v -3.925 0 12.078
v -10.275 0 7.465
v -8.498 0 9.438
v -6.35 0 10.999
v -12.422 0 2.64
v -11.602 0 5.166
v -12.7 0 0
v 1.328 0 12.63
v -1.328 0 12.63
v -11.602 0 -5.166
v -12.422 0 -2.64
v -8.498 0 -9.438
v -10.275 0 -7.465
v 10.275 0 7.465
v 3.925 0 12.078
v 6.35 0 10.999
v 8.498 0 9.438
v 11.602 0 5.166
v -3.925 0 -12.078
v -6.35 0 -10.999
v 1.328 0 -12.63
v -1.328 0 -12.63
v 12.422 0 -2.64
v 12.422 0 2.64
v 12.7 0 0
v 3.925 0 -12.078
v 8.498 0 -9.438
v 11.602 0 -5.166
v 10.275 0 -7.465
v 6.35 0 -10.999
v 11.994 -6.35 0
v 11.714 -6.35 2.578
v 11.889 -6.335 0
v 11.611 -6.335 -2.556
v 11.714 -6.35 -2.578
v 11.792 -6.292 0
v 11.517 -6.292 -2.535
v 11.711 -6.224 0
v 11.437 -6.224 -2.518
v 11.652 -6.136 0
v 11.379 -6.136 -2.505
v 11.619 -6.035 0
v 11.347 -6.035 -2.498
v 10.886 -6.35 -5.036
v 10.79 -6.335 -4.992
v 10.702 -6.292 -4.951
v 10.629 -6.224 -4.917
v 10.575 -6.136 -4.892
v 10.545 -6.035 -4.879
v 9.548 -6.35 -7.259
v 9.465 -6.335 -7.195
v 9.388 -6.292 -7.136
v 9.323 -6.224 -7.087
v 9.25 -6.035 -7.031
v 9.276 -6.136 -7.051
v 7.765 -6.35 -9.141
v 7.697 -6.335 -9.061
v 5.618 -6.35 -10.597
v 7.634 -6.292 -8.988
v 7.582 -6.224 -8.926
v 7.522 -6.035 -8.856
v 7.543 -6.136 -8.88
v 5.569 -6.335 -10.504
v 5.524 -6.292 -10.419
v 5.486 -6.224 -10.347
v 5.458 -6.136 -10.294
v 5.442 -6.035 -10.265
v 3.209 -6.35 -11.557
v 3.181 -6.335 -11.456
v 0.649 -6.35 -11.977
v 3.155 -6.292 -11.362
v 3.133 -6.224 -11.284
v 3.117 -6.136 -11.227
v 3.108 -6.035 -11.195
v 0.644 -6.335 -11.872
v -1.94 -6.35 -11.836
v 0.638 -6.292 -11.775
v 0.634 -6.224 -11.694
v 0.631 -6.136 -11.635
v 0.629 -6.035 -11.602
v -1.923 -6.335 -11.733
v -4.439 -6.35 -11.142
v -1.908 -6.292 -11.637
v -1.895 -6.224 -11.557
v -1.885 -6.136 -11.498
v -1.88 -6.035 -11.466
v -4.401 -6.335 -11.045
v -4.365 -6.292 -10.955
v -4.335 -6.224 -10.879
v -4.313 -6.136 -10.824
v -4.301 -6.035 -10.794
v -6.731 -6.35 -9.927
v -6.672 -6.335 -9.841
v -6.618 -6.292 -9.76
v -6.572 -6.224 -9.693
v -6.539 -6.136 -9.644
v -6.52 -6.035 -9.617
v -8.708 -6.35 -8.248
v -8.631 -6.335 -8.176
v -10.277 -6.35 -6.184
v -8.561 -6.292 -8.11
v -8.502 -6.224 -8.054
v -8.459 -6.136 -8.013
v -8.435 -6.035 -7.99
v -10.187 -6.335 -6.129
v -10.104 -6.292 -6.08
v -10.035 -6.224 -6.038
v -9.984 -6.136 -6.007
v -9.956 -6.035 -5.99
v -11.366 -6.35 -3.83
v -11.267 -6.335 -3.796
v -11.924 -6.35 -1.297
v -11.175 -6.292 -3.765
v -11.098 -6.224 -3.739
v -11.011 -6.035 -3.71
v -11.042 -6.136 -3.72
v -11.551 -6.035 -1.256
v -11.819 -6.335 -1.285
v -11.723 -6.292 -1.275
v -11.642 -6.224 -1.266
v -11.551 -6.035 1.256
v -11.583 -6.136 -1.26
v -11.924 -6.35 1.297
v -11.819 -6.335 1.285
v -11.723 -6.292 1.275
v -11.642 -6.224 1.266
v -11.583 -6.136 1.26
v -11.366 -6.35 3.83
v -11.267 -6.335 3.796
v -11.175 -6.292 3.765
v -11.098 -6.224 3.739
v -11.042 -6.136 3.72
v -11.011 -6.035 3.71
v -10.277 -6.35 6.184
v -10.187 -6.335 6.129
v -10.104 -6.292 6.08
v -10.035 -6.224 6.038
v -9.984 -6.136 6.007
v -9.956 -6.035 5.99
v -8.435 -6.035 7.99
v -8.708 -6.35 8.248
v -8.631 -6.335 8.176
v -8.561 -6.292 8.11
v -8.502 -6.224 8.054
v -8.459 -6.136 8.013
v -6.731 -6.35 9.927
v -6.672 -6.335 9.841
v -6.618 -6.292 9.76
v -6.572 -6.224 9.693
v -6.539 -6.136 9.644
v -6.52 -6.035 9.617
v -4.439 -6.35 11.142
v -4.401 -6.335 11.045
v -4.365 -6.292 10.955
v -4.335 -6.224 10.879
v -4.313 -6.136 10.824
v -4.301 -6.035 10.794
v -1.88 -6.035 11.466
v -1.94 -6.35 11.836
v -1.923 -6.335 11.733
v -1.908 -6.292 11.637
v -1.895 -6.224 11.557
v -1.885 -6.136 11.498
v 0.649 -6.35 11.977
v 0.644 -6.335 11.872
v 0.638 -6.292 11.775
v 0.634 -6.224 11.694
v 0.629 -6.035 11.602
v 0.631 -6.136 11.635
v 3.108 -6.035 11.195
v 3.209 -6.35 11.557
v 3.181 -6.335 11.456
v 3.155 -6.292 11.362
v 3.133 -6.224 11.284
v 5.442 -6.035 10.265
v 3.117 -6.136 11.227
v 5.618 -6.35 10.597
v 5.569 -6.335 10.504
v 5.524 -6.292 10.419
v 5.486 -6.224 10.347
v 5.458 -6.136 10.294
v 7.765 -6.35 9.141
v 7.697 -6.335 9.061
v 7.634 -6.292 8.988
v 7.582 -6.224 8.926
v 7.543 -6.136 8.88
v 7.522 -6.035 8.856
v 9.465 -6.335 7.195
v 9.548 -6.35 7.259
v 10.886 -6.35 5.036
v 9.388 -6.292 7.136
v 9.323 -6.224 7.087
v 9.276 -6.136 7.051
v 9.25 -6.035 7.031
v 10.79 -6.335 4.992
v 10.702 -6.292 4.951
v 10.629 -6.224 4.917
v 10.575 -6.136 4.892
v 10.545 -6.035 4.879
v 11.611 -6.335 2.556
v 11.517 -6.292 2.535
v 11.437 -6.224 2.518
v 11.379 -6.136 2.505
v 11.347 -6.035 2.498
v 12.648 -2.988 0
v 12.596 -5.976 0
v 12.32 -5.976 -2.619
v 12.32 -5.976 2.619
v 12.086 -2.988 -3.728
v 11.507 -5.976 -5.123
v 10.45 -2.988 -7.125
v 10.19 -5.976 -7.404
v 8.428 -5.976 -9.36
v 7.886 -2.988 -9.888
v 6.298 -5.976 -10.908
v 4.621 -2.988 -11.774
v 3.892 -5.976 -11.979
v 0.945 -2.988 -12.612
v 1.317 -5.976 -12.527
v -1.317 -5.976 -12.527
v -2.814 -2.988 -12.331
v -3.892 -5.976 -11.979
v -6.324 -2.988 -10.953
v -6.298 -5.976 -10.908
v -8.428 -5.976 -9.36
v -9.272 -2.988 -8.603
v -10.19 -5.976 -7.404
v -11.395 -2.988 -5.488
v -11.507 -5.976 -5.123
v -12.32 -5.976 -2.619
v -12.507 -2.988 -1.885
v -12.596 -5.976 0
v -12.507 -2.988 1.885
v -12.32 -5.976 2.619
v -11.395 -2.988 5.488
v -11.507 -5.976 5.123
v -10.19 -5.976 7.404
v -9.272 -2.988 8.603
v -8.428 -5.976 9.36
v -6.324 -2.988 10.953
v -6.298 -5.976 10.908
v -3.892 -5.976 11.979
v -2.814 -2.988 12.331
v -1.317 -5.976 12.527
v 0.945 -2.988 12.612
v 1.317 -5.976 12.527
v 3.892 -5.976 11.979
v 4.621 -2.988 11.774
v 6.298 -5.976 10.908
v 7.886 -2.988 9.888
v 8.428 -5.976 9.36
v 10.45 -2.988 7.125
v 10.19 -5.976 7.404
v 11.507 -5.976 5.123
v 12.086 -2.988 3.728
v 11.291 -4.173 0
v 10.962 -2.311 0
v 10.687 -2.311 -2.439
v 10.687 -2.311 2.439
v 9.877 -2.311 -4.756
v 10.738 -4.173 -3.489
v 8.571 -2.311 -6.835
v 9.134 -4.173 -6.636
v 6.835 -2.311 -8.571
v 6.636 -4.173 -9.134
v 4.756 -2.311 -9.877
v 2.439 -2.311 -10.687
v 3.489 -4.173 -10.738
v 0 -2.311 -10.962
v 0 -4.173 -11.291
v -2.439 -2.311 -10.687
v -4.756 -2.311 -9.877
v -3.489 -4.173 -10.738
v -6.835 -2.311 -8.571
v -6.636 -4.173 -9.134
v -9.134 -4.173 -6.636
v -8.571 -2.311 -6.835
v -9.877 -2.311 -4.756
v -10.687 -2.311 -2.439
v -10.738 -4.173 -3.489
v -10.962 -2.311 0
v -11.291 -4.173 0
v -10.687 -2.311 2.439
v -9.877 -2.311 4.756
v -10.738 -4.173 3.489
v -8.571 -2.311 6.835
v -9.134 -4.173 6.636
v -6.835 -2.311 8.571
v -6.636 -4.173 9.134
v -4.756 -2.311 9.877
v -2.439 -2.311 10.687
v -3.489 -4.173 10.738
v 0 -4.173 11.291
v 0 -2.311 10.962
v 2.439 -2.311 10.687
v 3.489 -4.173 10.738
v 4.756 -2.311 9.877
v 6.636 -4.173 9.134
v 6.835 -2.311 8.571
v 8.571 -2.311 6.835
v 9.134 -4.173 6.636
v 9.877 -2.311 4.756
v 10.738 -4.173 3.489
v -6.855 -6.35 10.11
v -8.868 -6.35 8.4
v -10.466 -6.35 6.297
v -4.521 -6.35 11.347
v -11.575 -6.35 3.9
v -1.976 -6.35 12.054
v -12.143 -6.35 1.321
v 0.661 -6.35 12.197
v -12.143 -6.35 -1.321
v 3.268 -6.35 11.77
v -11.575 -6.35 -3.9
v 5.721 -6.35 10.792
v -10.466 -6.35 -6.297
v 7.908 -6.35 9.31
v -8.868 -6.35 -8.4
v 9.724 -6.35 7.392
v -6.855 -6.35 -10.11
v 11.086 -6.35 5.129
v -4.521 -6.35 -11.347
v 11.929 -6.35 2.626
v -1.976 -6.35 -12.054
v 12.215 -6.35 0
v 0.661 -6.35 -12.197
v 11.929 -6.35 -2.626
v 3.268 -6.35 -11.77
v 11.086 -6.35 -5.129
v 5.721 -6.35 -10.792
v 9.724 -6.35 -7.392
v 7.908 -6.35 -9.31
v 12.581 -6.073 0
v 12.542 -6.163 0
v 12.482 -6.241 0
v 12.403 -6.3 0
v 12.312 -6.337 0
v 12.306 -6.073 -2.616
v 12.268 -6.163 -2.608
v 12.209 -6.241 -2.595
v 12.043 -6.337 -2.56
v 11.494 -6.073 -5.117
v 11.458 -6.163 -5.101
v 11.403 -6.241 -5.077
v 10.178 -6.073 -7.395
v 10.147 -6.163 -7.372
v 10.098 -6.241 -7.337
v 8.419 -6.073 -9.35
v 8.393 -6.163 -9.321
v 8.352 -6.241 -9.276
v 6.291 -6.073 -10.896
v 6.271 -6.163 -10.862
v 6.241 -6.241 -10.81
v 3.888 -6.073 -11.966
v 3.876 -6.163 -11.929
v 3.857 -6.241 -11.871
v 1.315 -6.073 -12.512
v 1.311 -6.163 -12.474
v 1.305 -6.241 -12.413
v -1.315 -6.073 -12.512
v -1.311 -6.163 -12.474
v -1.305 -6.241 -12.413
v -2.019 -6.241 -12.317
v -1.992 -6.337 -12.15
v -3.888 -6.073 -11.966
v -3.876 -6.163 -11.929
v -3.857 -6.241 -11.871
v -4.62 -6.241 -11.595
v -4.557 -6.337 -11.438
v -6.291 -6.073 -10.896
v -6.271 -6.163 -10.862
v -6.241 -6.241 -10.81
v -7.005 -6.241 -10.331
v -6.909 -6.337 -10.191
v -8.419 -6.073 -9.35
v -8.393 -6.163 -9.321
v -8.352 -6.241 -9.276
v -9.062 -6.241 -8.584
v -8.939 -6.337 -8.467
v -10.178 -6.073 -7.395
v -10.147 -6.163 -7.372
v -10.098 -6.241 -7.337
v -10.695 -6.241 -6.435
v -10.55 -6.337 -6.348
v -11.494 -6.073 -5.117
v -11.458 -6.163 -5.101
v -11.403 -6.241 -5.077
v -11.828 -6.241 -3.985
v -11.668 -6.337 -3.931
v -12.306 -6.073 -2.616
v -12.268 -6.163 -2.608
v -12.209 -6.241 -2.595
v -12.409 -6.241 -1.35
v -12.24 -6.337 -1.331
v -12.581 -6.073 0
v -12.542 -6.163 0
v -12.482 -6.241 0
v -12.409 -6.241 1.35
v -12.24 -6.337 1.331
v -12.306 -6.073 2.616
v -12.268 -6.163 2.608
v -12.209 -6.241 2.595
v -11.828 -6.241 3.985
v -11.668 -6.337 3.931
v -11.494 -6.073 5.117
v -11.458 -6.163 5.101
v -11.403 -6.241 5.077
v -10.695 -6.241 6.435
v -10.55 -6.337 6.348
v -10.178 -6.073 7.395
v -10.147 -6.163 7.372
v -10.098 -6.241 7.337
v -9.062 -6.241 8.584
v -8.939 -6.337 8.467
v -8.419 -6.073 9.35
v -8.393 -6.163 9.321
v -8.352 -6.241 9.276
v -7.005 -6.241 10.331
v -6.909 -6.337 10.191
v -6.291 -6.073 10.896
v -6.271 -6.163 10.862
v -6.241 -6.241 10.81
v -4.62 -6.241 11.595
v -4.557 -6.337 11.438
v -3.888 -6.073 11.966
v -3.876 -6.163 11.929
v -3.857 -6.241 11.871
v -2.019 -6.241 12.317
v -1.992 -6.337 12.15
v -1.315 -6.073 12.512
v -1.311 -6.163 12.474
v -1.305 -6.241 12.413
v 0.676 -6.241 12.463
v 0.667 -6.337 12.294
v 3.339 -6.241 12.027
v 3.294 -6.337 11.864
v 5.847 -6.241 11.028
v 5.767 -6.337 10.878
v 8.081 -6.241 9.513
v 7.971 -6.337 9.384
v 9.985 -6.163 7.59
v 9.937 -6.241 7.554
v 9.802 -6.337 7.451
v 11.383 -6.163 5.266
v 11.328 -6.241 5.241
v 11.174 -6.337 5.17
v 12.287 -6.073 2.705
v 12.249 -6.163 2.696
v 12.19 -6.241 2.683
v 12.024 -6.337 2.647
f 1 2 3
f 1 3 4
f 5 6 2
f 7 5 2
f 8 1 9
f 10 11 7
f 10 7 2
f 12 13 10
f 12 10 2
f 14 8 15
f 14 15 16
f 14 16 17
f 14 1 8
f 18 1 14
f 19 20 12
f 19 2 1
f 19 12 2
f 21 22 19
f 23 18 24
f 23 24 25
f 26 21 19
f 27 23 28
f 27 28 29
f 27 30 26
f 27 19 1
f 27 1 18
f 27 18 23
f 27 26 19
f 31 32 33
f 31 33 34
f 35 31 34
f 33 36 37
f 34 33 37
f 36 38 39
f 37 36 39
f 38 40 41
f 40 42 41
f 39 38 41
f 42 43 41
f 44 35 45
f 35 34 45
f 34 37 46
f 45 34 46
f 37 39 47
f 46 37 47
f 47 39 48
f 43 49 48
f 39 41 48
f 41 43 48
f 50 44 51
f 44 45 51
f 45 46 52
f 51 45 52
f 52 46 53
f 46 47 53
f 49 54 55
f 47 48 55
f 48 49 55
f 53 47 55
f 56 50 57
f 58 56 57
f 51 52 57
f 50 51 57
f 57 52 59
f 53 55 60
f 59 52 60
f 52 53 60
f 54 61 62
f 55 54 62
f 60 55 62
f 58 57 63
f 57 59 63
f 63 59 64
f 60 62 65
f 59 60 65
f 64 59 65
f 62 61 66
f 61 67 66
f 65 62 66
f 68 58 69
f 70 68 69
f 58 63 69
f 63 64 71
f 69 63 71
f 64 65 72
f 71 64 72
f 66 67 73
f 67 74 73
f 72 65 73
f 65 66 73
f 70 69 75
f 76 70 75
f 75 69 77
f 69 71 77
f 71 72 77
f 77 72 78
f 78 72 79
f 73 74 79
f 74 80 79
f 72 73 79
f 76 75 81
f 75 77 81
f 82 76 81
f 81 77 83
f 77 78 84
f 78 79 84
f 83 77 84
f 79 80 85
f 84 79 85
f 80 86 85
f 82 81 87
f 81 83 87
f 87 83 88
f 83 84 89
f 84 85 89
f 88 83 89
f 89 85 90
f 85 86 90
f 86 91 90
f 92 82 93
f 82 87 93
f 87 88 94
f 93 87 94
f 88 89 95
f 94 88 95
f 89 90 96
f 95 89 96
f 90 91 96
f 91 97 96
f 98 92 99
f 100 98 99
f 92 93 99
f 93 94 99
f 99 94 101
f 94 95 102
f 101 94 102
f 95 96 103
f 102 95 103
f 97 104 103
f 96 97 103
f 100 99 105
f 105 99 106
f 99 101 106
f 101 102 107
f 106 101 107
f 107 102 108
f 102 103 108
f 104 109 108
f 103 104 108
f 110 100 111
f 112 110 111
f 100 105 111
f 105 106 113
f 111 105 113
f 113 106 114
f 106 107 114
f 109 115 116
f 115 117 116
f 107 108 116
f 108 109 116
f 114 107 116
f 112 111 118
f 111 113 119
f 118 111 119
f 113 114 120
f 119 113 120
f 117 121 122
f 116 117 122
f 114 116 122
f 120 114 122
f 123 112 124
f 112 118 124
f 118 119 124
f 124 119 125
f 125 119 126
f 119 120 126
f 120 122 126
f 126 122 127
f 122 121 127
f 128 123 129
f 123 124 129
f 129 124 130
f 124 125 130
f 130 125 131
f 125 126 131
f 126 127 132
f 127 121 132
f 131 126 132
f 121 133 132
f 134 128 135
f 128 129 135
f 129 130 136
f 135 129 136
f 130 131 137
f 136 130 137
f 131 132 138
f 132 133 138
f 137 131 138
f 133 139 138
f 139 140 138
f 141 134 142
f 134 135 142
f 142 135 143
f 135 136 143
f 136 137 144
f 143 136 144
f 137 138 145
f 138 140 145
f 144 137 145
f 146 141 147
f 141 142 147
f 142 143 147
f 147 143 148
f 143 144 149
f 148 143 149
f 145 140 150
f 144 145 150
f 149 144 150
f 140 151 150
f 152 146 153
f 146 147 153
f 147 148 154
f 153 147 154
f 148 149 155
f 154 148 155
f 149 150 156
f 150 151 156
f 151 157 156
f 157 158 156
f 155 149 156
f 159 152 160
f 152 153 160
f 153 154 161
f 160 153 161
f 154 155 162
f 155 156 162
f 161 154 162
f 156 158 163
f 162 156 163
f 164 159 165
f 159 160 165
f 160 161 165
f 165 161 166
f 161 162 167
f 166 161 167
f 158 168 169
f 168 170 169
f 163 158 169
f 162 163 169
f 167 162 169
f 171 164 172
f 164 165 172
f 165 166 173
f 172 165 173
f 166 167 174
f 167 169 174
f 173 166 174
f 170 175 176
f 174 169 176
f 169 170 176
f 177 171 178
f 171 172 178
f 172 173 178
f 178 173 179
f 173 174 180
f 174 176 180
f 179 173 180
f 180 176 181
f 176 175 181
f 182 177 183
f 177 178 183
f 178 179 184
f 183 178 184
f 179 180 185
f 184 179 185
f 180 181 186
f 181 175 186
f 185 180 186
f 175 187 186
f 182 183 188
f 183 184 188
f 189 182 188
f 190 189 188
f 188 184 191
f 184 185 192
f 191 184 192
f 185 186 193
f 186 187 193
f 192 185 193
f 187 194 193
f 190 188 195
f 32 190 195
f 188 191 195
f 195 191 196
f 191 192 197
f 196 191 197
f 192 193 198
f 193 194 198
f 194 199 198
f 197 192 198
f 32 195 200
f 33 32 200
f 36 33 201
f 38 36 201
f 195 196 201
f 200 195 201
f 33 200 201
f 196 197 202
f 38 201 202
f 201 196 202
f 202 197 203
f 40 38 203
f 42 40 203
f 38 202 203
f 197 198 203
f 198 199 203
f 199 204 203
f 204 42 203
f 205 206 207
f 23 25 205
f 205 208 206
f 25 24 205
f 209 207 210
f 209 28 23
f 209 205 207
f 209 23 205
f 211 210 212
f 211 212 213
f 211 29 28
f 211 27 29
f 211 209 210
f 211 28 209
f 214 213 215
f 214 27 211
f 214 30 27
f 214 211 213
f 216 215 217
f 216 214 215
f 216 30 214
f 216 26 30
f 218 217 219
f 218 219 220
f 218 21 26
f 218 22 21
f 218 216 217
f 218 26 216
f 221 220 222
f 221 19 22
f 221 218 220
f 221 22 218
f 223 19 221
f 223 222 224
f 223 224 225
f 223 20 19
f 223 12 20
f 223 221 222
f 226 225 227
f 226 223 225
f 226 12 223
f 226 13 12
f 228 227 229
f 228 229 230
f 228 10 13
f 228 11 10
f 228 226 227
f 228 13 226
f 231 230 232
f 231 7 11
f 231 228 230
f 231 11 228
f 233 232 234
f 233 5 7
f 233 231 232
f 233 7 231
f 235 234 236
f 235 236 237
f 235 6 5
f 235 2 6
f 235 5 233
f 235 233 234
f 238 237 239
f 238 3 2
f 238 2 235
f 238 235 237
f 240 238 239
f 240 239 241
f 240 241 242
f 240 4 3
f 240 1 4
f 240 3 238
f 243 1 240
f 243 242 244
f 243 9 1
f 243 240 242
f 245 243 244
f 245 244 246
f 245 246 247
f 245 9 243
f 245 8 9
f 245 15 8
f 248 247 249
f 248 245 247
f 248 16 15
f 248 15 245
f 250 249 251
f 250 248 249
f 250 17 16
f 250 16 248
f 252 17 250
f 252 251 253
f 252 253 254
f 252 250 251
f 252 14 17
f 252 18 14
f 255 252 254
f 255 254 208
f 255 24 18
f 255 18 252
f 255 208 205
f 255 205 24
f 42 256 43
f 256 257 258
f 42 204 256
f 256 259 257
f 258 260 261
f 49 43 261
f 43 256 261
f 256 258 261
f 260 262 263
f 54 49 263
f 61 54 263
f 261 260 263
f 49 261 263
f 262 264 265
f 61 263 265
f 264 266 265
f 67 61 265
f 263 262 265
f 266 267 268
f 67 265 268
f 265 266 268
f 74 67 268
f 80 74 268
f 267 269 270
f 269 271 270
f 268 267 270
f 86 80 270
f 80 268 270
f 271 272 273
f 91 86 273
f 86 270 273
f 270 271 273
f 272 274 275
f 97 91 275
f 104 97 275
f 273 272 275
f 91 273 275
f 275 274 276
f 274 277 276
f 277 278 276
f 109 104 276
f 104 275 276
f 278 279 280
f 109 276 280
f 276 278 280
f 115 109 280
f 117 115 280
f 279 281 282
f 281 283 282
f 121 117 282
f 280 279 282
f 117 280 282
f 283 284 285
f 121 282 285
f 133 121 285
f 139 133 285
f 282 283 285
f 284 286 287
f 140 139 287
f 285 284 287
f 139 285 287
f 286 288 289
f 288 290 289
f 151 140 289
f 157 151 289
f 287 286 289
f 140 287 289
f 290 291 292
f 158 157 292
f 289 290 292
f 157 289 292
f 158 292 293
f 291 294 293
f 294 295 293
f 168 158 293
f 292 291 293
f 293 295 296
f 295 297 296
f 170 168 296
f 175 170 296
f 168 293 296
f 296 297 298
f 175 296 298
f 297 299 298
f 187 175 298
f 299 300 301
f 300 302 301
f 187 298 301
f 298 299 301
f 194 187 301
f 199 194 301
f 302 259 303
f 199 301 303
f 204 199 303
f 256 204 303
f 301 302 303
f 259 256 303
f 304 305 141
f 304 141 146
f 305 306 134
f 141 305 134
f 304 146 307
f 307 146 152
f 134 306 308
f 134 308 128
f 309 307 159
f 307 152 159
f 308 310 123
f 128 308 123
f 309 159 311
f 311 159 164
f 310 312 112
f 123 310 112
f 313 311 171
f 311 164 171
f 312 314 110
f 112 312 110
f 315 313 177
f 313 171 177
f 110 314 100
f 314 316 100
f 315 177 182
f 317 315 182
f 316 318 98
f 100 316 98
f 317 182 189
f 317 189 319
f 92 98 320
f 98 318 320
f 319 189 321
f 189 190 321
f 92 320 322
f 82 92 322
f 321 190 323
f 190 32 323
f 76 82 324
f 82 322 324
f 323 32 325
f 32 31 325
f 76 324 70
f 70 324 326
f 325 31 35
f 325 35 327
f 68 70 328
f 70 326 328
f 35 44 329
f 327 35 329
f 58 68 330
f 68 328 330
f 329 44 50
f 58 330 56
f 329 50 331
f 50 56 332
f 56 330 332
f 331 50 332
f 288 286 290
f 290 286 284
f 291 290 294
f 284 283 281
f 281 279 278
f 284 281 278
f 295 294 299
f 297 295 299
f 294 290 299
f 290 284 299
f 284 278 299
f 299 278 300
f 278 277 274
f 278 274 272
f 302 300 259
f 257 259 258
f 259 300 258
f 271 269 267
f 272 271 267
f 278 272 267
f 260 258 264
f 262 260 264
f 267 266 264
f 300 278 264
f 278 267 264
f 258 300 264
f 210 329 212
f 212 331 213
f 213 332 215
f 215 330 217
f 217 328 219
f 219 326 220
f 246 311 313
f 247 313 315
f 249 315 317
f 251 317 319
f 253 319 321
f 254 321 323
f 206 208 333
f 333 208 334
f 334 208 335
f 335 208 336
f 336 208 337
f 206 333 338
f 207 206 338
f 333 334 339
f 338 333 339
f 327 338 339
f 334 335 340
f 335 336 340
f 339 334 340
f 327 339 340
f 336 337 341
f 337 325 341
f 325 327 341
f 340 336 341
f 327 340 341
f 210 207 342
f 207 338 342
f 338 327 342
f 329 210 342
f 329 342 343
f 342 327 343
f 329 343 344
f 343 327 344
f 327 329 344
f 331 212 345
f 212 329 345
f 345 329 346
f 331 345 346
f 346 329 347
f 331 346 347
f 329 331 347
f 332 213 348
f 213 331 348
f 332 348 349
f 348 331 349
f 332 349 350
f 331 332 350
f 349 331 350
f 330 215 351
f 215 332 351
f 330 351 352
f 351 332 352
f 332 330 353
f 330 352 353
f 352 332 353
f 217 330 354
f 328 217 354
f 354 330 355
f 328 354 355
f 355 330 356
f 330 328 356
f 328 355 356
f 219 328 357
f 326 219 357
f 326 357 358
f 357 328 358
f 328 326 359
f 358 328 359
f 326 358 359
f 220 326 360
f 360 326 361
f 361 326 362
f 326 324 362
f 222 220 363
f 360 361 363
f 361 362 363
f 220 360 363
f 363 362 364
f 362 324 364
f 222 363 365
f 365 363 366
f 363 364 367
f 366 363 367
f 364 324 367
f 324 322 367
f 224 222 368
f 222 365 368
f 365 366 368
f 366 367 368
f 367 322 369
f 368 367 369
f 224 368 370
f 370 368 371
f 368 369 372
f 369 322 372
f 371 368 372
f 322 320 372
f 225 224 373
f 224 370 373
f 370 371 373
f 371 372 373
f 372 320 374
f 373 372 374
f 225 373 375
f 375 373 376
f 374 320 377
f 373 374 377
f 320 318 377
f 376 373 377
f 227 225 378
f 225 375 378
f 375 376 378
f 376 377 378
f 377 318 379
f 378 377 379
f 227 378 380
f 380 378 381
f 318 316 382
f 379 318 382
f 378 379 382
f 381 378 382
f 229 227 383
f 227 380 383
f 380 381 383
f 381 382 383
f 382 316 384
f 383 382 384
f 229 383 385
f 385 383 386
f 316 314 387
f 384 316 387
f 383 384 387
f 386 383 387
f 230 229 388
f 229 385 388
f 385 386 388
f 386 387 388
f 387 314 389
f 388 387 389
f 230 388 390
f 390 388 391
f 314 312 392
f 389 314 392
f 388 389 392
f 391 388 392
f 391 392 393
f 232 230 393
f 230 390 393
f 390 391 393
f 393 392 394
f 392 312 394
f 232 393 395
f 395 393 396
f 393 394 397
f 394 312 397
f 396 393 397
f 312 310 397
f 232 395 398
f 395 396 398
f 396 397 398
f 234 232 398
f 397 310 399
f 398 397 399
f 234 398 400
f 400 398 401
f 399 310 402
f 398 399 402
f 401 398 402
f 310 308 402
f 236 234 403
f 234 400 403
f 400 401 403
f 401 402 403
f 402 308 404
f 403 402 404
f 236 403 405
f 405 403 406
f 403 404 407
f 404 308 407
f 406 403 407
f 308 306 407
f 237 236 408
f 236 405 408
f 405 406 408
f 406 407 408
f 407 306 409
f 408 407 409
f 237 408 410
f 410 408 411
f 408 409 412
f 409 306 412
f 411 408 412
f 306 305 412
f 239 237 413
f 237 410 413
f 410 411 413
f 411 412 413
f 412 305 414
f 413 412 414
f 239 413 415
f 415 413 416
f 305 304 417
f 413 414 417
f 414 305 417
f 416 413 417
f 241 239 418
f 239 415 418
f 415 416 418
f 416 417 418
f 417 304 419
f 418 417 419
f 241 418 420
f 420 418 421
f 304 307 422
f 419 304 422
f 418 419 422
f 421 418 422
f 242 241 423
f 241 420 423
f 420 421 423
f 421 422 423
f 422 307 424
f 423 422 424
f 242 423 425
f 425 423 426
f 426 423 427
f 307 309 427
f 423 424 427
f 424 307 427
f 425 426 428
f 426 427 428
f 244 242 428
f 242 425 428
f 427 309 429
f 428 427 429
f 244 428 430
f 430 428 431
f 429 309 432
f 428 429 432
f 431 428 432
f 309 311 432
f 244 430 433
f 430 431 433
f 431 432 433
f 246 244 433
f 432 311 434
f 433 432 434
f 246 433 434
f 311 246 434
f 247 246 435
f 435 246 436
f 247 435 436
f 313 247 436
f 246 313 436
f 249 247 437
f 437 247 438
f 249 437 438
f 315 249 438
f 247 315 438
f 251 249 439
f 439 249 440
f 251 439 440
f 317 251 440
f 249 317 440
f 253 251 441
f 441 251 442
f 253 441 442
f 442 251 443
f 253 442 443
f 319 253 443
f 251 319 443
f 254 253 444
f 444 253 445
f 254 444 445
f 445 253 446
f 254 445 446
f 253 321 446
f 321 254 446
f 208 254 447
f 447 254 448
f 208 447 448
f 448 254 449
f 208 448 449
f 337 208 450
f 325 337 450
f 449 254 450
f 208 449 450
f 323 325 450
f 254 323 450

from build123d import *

# Parameters (mm, degrees)
SKETCH1_R           = 12.7
BOSS_EXTRUDE1_DEPTH = 2.3114
BOSS_EXTRUDE1_DRAFT = -1
SKETCH7_R           = 12.7
SKETCH7_R_2         = 10.922
BOSS_EXTRUDE3_DEPTH = 6.35
BOSS_EXTRUDE3_DRAFT = -1
DRAFT1_ANGLE        = 10
FILLET2_R           = 0.381


with BuildPart() as part:
    # Sketch1 → Boss-Extrude1 (with draft: the straight prism first)
    with BuildSketch(Plane(origin=(0, 0, 0), x_dir=(1, 0, 0), z_dir=(0, 1, 0))):
        Circle(SKETCH1_R)
    extrude(amount=-BOSS_EXTRUDE1_DEPTH)
    # Boss-Extrude1: the draft: its side faces are tilted about the plane it starts from
    boss_extrude1_sides = [part.faces().sort_by_distance(p)[0] for p in [
        (-12.7, -1.1557, 0),
    ]]
    draft(boss_extrude1_sides, Plane(origin=(0, 0, 0), x_dir=(1, 0, 0), z_dir=(0, 1, 0)), BOSS_EXTRUDE1_DRAFT)


with BuildPart() as boss_extrude3_tool:
    # Sketch7 → Boss-Extrude3 (with draft: the straight prism first)
    with BuildSketch(Plane(origin=(0, 0, 0), x_dir=(1, 0, 0), z_dir=(0, 1, 0))):
        Circle(SKETCH7_R)
        Circle(SKETCH7_R_2, mode=Mode.SUBTRACT)
    extrude(amount=-BOSS_EXTRUDE3_DEPTH)
    # Boss-Extrude3: the draft: its side faces are tilted about the plane it starts from
    boss_extrude3_sides = [boss_extrude3_tool.faces().sort_by_distance(p)[0] for p in [
        (-12.7, -3.175, 0),
        (-10.922, -3.175, 0),
    ]]
    draft(boss_extrude3_sides, Plane(origin=(0, 0, 0), x_dir=(1, 0, 0), z_dir=(0, 1, 0)), BOSS_EXTRUDE3_DRAFT)


with BuildPart() as part_1:
    add(part.part)

    # Boss-Extrude3: add boss_extrude3_tool
    add(boss_extrude3_tool.part)

    # Draft1
    draft1_faces = [part_1.faces().sort_by_distance(p)[0] for p in [
        (-10.99759265, -4.3307, 0),
    ]]
    draft(draft1_faces, Plane(origin=(0, -2.3114, 0), x_dir=(0, 0, -1), z_dir=(0, -1, 0)), DRAFT1_ANGLE)

    # Fillet2
    fillet2_edges = [part_1.edges().sort_by_distance(p)[0] for p in [
        (-12.589160338, -6.35, 0),
        (-11.674459781, -6.35, 0),
    ]]
    fillet(fillet2_edges, radius=FILLET2_R)


solid = part_1.part
